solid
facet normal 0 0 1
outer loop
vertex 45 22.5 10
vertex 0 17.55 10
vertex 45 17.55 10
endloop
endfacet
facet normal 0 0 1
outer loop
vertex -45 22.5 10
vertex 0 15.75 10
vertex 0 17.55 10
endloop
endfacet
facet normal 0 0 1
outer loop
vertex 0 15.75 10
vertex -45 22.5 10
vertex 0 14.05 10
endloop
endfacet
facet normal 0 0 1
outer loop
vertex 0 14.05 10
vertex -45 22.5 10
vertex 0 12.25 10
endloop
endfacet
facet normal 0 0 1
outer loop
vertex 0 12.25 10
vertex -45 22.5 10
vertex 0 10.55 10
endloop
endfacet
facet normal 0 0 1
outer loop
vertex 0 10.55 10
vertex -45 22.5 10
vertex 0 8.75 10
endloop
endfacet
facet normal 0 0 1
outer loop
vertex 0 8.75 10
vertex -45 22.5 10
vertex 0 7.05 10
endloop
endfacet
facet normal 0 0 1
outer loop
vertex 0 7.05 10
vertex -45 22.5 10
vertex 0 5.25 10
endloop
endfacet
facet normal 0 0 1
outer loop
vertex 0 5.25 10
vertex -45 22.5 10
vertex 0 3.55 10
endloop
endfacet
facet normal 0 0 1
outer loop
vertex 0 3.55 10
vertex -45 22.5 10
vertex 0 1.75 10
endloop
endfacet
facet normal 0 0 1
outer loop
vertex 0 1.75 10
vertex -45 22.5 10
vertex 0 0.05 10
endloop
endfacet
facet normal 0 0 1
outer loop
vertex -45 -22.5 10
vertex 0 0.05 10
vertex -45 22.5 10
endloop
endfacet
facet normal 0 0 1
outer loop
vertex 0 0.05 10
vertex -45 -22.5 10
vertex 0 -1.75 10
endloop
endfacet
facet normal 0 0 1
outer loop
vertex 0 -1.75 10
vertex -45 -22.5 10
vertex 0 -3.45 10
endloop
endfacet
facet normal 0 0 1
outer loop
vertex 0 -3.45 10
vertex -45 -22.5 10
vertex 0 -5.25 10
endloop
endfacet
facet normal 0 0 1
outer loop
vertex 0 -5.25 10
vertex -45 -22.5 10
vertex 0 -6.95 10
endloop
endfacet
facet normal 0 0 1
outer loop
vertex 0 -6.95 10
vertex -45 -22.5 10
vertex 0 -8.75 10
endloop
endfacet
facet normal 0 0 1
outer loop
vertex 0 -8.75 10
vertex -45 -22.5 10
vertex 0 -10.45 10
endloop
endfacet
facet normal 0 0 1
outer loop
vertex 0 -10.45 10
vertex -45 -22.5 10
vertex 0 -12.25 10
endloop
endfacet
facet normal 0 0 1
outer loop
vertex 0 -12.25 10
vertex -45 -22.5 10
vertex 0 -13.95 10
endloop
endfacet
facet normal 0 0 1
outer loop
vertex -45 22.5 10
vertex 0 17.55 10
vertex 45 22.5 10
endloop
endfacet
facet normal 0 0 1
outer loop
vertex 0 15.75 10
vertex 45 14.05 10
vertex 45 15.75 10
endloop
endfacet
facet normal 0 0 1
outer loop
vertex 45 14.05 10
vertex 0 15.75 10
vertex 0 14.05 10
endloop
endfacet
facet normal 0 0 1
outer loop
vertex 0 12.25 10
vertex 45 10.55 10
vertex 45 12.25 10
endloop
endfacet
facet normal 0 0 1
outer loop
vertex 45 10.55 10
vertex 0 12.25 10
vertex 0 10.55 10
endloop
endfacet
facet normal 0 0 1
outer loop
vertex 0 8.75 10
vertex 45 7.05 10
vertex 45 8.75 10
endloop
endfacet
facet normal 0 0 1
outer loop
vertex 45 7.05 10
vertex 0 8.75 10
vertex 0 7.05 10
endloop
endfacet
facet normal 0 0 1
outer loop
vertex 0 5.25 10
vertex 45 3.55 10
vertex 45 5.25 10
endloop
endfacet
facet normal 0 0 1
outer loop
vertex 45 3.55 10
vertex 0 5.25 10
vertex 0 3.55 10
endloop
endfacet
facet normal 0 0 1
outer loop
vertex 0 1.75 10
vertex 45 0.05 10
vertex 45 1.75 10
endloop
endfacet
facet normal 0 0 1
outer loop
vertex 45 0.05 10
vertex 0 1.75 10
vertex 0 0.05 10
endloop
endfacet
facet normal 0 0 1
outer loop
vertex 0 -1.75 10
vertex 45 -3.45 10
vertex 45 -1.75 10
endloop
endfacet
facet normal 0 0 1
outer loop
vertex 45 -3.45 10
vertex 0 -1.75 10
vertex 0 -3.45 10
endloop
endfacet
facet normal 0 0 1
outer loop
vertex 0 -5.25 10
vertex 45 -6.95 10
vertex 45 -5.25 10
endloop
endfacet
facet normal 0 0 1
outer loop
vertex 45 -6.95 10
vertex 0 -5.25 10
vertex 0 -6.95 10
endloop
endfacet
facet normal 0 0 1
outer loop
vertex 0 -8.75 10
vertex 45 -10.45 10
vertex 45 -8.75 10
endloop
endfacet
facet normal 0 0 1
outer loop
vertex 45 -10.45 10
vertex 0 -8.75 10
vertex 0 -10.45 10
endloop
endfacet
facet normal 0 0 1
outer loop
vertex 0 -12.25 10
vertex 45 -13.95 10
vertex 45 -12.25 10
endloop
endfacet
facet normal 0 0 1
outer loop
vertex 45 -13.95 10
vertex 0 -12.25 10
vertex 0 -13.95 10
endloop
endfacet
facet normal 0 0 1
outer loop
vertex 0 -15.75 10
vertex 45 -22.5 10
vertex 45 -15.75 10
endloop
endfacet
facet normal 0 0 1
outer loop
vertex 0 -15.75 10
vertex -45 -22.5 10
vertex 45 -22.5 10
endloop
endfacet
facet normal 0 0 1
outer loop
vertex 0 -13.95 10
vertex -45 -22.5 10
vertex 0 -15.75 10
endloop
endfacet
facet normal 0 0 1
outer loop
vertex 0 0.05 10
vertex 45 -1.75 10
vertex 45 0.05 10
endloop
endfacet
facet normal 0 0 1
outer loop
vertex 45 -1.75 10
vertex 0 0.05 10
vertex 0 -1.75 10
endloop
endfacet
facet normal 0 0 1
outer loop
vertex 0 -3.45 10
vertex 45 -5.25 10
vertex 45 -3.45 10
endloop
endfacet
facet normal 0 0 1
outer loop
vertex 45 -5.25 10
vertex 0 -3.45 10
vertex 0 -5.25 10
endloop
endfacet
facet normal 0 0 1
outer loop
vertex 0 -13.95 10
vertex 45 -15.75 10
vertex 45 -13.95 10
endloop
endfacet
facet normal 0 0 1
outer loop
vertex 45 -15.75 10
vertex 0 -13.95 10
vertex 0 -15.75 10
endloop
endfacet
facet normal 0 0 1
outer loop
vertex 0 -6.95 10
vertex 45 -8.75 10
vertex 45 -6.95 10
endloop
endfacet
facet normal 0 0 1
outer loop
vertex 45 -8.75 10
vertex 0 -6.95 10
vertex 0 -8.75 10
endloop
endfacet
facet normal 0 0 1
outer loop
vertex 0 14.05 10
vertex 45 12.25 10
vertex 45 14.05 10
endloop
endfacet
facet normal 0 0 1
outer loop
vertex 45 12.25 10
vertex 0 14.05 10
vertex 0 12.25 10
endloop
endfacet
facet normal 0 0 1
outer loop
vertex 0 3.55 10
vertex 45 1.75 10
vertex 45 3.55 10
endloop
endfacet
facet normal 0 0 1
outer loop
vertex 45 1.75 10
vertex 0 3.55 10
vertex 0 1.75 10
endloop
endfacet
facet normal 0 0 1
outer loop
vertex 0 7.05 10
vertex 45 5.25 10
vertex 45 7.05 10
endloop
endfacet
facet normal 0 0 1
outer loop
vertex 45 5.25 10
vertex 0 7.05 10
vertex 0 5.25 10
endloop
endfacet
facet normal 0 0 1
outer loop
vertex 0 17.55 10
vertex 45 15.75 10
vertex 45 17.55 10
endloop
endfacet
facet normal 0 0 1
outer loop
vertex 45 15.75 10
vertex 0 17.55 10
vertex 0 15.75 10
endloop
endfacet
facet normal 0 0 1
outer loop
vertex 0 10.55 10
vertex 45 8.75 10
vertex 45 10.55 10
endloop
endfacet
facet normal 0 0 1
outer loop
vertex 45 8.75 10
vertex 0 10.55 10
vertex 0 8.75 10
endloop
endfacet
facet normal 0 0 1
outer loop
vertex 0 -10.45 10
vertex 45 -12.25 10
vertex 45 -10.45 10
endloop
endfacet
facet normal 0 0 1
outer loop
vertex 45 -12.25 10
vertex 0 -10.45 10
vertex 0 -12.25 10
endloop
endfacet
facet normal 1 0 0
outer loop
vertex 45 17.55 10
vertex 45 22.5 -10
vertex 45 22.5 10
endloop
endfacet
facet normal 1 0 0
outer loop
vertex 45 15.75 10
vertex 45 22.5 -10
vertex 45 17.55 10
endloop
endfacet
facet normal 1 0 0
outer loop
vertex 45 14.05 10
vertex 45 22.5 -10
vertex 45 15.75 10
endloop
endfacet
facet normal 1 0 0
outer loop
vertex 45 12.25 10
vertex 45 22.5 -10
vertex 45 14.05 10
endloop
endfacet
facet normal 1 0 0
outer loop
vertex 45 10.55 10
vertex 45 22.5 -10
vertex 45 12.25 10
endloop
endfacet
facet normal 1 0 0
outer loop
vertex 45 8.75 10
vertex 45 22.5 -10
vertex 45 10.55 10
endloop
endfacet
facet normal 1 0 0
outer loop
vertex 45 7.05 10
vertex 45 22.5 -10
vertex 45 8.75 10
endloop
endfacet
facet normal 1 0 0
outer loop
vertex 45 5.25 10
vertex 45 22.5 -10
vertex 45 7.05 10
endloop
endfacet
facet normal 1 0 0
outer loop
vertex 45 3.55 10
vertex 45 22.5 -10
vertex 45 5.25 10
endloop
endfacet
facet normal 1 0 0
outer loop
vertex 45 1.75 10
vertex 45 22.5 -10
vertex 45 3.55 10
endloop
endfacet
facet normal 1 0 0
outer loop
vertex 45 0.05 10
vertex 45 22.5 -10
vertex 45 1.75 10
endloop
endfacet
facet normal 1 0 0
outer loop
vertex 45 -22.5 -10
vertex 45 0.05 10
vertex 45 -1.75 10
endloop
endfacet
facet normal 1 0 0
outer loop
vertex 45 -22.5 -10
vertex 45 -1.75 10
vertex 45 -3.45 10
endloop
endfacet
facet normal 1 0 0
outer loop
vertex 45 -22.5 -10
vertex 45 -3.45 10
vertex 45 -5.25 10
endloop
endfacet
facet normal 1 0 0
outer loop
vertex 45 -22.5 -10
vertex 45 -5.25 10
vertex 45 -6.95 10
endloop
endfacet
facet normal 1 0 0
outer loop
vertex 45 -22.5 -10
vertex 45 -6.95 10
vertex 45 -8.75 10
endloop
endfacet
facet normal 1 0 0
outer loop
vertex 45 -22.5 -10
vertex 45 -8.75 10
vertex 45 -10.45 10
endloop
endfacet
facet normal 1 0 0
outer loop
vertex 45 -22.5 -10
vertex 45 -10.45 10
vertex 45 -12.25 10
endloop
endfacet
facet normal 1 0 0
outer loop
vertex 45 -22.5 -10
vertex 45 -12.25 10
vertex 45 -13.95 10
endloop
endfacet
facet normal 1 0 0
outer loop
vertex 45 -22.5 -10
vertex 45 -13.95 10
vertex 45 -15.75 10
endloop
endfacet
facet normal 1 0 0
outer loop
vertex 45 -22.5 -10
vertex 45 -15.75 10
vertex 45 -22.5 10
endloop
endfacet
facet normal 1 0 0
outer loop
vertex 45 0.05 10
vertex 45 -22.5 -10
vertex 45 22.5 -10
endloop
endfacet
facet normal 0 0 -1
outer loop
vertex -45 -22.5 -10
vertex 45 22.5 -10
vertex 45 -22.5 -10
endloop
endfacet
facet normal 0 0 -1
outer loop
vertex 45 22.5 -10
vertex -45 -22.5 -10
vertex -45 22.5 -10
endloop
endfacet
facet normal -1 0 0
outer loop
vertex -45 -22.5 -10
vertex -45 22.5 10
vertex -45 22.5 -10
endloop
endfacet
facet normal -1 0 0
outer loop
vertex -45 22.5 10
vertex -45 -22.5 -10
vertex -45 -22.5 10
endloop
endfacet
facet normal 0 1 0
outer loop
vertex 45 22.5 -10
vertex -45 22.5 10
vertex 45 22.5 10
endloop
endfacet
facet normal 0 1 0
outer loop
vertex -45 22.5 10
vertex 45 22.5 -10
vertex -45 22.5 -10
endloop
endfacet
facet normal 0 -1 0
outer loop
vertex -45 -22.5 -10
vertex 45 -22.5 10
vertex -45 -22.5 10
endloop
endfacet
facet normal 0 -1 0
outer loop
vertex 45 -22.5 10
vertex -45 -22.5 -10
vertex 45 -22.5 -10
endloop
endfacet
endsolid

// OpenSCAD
// Drying Rack for 10 Microscope Slides
// Base: 90 x 45 x 20 mm
// Slots: 10 parallel slots along X, 77mm long, 1.6mm wide, 10mm deep
// Spacing: 3.5mm centre-to-centre in Y

$fn = 128;

// Base Dimensions
base_length = 90;  // X
base_width = 45;   // Y
base_height = 20;  // Z

// Slot Dimensions
num_slots = 10;
slot_length = 77;  // X (runs along length)
slot_width = 1.6;  // Y
slot_depth = 10;   // Z

// Spacing
slot_spacing = 3.5; // Centre-to-centre in Y

// Calculation for Y positioning
// Total width occupied by slots = num_slots * slot_width
// Total gaps = num_slots - 1
// We need the group to be centred in Y (base_width/2)
// Let's calculate the offset from the edge to the first slot centre
// Or simpler: Calculate the position of the first slot centre relative to the block centre.
// The pattern is symmetric.
// Distance from centre to first slot centre = ( (num_slots-1) * slot_spacing ) / 2
// Wait, the slots are spaced 3.5mm apart.
// Let's verify the total span.
// If we have 10 slots, there are 9 gaps between them.
// Total gap width = 9 * 3.5 = 31.5 mm.
// Total slot width = 10 * 1.6 = 16.0 mm.
// Total span of the slot group = 31.5 + 16.0 = 47.5 mm.
// The block width is 45 mm.
// The prompt says "group of slots is centred on the block in X and Y".
// However, the total span (47.5mm) is larger than the block width (45mm).
// This implies the slots will overhang the sides of the block.
// We will follow the instruction "centred on the block" strictly, meaning the geometric centre of the slot array aligns with the geometric centre of the block.

// Calculate Y position of the first slot centre
// The array of centres is: -4.5, -1.0, 2.5, ...
// Let's derive the offset from the block centre (0,0).
// The distance from the centre of the array to the centre of the first slot is:
// ( (num_slots - 1) * slot_spacing ) / 2
// = (9 * 3.5) / 2 = 15.75 mm.
// So the first slot centre is at Y = -15.75 mm.

y_offset_first = ((num_slots - 1) * slot_spacing) / 2;

// Build the base block
difference() {
    // Main Block
    cube([base_length, base_width, base_height], center = true);
    
    // Cut Slots
    // We iterate from i = 0 to num_slots - 1
    for (i = [0 : num_slots - 1]) {
        // Calculate Y position for this slot
        // y_pos = -y_offset_first + i * slot_spacing
        y_pos = -y_offset_first + (i * slot_spacing);
        
        // Define the cutting volume
        // The slot runs along X (length slot_length)
        // It is located at Y = y_pos with width slot_width
        // It goes down Z from top (base_height) by slot_depth
        
        // To ensure clean cuts, we extend slightly past the faces
        // X: extend 0.1mm past the ends of the slot
        // Y: extend 0.1mm past the sides of the slot
        // Z: extend 0.1mm past the bottom of the cut
        
        translate([0, y_pos, base_height - slot_depth]) {
            // Slot dimensions with clearance
            slot_clearance_x = 0.1;
            slot_clearance_y = 0.1;
            slot_clearance_z = 0.1;
            
            cube([
                slot_length + 2 * slot_clearance_x,
                slot_width + 2 * slot_clearance_y,
                slot_depth + slot_clearance_z
            ]);
        }
    }
}
